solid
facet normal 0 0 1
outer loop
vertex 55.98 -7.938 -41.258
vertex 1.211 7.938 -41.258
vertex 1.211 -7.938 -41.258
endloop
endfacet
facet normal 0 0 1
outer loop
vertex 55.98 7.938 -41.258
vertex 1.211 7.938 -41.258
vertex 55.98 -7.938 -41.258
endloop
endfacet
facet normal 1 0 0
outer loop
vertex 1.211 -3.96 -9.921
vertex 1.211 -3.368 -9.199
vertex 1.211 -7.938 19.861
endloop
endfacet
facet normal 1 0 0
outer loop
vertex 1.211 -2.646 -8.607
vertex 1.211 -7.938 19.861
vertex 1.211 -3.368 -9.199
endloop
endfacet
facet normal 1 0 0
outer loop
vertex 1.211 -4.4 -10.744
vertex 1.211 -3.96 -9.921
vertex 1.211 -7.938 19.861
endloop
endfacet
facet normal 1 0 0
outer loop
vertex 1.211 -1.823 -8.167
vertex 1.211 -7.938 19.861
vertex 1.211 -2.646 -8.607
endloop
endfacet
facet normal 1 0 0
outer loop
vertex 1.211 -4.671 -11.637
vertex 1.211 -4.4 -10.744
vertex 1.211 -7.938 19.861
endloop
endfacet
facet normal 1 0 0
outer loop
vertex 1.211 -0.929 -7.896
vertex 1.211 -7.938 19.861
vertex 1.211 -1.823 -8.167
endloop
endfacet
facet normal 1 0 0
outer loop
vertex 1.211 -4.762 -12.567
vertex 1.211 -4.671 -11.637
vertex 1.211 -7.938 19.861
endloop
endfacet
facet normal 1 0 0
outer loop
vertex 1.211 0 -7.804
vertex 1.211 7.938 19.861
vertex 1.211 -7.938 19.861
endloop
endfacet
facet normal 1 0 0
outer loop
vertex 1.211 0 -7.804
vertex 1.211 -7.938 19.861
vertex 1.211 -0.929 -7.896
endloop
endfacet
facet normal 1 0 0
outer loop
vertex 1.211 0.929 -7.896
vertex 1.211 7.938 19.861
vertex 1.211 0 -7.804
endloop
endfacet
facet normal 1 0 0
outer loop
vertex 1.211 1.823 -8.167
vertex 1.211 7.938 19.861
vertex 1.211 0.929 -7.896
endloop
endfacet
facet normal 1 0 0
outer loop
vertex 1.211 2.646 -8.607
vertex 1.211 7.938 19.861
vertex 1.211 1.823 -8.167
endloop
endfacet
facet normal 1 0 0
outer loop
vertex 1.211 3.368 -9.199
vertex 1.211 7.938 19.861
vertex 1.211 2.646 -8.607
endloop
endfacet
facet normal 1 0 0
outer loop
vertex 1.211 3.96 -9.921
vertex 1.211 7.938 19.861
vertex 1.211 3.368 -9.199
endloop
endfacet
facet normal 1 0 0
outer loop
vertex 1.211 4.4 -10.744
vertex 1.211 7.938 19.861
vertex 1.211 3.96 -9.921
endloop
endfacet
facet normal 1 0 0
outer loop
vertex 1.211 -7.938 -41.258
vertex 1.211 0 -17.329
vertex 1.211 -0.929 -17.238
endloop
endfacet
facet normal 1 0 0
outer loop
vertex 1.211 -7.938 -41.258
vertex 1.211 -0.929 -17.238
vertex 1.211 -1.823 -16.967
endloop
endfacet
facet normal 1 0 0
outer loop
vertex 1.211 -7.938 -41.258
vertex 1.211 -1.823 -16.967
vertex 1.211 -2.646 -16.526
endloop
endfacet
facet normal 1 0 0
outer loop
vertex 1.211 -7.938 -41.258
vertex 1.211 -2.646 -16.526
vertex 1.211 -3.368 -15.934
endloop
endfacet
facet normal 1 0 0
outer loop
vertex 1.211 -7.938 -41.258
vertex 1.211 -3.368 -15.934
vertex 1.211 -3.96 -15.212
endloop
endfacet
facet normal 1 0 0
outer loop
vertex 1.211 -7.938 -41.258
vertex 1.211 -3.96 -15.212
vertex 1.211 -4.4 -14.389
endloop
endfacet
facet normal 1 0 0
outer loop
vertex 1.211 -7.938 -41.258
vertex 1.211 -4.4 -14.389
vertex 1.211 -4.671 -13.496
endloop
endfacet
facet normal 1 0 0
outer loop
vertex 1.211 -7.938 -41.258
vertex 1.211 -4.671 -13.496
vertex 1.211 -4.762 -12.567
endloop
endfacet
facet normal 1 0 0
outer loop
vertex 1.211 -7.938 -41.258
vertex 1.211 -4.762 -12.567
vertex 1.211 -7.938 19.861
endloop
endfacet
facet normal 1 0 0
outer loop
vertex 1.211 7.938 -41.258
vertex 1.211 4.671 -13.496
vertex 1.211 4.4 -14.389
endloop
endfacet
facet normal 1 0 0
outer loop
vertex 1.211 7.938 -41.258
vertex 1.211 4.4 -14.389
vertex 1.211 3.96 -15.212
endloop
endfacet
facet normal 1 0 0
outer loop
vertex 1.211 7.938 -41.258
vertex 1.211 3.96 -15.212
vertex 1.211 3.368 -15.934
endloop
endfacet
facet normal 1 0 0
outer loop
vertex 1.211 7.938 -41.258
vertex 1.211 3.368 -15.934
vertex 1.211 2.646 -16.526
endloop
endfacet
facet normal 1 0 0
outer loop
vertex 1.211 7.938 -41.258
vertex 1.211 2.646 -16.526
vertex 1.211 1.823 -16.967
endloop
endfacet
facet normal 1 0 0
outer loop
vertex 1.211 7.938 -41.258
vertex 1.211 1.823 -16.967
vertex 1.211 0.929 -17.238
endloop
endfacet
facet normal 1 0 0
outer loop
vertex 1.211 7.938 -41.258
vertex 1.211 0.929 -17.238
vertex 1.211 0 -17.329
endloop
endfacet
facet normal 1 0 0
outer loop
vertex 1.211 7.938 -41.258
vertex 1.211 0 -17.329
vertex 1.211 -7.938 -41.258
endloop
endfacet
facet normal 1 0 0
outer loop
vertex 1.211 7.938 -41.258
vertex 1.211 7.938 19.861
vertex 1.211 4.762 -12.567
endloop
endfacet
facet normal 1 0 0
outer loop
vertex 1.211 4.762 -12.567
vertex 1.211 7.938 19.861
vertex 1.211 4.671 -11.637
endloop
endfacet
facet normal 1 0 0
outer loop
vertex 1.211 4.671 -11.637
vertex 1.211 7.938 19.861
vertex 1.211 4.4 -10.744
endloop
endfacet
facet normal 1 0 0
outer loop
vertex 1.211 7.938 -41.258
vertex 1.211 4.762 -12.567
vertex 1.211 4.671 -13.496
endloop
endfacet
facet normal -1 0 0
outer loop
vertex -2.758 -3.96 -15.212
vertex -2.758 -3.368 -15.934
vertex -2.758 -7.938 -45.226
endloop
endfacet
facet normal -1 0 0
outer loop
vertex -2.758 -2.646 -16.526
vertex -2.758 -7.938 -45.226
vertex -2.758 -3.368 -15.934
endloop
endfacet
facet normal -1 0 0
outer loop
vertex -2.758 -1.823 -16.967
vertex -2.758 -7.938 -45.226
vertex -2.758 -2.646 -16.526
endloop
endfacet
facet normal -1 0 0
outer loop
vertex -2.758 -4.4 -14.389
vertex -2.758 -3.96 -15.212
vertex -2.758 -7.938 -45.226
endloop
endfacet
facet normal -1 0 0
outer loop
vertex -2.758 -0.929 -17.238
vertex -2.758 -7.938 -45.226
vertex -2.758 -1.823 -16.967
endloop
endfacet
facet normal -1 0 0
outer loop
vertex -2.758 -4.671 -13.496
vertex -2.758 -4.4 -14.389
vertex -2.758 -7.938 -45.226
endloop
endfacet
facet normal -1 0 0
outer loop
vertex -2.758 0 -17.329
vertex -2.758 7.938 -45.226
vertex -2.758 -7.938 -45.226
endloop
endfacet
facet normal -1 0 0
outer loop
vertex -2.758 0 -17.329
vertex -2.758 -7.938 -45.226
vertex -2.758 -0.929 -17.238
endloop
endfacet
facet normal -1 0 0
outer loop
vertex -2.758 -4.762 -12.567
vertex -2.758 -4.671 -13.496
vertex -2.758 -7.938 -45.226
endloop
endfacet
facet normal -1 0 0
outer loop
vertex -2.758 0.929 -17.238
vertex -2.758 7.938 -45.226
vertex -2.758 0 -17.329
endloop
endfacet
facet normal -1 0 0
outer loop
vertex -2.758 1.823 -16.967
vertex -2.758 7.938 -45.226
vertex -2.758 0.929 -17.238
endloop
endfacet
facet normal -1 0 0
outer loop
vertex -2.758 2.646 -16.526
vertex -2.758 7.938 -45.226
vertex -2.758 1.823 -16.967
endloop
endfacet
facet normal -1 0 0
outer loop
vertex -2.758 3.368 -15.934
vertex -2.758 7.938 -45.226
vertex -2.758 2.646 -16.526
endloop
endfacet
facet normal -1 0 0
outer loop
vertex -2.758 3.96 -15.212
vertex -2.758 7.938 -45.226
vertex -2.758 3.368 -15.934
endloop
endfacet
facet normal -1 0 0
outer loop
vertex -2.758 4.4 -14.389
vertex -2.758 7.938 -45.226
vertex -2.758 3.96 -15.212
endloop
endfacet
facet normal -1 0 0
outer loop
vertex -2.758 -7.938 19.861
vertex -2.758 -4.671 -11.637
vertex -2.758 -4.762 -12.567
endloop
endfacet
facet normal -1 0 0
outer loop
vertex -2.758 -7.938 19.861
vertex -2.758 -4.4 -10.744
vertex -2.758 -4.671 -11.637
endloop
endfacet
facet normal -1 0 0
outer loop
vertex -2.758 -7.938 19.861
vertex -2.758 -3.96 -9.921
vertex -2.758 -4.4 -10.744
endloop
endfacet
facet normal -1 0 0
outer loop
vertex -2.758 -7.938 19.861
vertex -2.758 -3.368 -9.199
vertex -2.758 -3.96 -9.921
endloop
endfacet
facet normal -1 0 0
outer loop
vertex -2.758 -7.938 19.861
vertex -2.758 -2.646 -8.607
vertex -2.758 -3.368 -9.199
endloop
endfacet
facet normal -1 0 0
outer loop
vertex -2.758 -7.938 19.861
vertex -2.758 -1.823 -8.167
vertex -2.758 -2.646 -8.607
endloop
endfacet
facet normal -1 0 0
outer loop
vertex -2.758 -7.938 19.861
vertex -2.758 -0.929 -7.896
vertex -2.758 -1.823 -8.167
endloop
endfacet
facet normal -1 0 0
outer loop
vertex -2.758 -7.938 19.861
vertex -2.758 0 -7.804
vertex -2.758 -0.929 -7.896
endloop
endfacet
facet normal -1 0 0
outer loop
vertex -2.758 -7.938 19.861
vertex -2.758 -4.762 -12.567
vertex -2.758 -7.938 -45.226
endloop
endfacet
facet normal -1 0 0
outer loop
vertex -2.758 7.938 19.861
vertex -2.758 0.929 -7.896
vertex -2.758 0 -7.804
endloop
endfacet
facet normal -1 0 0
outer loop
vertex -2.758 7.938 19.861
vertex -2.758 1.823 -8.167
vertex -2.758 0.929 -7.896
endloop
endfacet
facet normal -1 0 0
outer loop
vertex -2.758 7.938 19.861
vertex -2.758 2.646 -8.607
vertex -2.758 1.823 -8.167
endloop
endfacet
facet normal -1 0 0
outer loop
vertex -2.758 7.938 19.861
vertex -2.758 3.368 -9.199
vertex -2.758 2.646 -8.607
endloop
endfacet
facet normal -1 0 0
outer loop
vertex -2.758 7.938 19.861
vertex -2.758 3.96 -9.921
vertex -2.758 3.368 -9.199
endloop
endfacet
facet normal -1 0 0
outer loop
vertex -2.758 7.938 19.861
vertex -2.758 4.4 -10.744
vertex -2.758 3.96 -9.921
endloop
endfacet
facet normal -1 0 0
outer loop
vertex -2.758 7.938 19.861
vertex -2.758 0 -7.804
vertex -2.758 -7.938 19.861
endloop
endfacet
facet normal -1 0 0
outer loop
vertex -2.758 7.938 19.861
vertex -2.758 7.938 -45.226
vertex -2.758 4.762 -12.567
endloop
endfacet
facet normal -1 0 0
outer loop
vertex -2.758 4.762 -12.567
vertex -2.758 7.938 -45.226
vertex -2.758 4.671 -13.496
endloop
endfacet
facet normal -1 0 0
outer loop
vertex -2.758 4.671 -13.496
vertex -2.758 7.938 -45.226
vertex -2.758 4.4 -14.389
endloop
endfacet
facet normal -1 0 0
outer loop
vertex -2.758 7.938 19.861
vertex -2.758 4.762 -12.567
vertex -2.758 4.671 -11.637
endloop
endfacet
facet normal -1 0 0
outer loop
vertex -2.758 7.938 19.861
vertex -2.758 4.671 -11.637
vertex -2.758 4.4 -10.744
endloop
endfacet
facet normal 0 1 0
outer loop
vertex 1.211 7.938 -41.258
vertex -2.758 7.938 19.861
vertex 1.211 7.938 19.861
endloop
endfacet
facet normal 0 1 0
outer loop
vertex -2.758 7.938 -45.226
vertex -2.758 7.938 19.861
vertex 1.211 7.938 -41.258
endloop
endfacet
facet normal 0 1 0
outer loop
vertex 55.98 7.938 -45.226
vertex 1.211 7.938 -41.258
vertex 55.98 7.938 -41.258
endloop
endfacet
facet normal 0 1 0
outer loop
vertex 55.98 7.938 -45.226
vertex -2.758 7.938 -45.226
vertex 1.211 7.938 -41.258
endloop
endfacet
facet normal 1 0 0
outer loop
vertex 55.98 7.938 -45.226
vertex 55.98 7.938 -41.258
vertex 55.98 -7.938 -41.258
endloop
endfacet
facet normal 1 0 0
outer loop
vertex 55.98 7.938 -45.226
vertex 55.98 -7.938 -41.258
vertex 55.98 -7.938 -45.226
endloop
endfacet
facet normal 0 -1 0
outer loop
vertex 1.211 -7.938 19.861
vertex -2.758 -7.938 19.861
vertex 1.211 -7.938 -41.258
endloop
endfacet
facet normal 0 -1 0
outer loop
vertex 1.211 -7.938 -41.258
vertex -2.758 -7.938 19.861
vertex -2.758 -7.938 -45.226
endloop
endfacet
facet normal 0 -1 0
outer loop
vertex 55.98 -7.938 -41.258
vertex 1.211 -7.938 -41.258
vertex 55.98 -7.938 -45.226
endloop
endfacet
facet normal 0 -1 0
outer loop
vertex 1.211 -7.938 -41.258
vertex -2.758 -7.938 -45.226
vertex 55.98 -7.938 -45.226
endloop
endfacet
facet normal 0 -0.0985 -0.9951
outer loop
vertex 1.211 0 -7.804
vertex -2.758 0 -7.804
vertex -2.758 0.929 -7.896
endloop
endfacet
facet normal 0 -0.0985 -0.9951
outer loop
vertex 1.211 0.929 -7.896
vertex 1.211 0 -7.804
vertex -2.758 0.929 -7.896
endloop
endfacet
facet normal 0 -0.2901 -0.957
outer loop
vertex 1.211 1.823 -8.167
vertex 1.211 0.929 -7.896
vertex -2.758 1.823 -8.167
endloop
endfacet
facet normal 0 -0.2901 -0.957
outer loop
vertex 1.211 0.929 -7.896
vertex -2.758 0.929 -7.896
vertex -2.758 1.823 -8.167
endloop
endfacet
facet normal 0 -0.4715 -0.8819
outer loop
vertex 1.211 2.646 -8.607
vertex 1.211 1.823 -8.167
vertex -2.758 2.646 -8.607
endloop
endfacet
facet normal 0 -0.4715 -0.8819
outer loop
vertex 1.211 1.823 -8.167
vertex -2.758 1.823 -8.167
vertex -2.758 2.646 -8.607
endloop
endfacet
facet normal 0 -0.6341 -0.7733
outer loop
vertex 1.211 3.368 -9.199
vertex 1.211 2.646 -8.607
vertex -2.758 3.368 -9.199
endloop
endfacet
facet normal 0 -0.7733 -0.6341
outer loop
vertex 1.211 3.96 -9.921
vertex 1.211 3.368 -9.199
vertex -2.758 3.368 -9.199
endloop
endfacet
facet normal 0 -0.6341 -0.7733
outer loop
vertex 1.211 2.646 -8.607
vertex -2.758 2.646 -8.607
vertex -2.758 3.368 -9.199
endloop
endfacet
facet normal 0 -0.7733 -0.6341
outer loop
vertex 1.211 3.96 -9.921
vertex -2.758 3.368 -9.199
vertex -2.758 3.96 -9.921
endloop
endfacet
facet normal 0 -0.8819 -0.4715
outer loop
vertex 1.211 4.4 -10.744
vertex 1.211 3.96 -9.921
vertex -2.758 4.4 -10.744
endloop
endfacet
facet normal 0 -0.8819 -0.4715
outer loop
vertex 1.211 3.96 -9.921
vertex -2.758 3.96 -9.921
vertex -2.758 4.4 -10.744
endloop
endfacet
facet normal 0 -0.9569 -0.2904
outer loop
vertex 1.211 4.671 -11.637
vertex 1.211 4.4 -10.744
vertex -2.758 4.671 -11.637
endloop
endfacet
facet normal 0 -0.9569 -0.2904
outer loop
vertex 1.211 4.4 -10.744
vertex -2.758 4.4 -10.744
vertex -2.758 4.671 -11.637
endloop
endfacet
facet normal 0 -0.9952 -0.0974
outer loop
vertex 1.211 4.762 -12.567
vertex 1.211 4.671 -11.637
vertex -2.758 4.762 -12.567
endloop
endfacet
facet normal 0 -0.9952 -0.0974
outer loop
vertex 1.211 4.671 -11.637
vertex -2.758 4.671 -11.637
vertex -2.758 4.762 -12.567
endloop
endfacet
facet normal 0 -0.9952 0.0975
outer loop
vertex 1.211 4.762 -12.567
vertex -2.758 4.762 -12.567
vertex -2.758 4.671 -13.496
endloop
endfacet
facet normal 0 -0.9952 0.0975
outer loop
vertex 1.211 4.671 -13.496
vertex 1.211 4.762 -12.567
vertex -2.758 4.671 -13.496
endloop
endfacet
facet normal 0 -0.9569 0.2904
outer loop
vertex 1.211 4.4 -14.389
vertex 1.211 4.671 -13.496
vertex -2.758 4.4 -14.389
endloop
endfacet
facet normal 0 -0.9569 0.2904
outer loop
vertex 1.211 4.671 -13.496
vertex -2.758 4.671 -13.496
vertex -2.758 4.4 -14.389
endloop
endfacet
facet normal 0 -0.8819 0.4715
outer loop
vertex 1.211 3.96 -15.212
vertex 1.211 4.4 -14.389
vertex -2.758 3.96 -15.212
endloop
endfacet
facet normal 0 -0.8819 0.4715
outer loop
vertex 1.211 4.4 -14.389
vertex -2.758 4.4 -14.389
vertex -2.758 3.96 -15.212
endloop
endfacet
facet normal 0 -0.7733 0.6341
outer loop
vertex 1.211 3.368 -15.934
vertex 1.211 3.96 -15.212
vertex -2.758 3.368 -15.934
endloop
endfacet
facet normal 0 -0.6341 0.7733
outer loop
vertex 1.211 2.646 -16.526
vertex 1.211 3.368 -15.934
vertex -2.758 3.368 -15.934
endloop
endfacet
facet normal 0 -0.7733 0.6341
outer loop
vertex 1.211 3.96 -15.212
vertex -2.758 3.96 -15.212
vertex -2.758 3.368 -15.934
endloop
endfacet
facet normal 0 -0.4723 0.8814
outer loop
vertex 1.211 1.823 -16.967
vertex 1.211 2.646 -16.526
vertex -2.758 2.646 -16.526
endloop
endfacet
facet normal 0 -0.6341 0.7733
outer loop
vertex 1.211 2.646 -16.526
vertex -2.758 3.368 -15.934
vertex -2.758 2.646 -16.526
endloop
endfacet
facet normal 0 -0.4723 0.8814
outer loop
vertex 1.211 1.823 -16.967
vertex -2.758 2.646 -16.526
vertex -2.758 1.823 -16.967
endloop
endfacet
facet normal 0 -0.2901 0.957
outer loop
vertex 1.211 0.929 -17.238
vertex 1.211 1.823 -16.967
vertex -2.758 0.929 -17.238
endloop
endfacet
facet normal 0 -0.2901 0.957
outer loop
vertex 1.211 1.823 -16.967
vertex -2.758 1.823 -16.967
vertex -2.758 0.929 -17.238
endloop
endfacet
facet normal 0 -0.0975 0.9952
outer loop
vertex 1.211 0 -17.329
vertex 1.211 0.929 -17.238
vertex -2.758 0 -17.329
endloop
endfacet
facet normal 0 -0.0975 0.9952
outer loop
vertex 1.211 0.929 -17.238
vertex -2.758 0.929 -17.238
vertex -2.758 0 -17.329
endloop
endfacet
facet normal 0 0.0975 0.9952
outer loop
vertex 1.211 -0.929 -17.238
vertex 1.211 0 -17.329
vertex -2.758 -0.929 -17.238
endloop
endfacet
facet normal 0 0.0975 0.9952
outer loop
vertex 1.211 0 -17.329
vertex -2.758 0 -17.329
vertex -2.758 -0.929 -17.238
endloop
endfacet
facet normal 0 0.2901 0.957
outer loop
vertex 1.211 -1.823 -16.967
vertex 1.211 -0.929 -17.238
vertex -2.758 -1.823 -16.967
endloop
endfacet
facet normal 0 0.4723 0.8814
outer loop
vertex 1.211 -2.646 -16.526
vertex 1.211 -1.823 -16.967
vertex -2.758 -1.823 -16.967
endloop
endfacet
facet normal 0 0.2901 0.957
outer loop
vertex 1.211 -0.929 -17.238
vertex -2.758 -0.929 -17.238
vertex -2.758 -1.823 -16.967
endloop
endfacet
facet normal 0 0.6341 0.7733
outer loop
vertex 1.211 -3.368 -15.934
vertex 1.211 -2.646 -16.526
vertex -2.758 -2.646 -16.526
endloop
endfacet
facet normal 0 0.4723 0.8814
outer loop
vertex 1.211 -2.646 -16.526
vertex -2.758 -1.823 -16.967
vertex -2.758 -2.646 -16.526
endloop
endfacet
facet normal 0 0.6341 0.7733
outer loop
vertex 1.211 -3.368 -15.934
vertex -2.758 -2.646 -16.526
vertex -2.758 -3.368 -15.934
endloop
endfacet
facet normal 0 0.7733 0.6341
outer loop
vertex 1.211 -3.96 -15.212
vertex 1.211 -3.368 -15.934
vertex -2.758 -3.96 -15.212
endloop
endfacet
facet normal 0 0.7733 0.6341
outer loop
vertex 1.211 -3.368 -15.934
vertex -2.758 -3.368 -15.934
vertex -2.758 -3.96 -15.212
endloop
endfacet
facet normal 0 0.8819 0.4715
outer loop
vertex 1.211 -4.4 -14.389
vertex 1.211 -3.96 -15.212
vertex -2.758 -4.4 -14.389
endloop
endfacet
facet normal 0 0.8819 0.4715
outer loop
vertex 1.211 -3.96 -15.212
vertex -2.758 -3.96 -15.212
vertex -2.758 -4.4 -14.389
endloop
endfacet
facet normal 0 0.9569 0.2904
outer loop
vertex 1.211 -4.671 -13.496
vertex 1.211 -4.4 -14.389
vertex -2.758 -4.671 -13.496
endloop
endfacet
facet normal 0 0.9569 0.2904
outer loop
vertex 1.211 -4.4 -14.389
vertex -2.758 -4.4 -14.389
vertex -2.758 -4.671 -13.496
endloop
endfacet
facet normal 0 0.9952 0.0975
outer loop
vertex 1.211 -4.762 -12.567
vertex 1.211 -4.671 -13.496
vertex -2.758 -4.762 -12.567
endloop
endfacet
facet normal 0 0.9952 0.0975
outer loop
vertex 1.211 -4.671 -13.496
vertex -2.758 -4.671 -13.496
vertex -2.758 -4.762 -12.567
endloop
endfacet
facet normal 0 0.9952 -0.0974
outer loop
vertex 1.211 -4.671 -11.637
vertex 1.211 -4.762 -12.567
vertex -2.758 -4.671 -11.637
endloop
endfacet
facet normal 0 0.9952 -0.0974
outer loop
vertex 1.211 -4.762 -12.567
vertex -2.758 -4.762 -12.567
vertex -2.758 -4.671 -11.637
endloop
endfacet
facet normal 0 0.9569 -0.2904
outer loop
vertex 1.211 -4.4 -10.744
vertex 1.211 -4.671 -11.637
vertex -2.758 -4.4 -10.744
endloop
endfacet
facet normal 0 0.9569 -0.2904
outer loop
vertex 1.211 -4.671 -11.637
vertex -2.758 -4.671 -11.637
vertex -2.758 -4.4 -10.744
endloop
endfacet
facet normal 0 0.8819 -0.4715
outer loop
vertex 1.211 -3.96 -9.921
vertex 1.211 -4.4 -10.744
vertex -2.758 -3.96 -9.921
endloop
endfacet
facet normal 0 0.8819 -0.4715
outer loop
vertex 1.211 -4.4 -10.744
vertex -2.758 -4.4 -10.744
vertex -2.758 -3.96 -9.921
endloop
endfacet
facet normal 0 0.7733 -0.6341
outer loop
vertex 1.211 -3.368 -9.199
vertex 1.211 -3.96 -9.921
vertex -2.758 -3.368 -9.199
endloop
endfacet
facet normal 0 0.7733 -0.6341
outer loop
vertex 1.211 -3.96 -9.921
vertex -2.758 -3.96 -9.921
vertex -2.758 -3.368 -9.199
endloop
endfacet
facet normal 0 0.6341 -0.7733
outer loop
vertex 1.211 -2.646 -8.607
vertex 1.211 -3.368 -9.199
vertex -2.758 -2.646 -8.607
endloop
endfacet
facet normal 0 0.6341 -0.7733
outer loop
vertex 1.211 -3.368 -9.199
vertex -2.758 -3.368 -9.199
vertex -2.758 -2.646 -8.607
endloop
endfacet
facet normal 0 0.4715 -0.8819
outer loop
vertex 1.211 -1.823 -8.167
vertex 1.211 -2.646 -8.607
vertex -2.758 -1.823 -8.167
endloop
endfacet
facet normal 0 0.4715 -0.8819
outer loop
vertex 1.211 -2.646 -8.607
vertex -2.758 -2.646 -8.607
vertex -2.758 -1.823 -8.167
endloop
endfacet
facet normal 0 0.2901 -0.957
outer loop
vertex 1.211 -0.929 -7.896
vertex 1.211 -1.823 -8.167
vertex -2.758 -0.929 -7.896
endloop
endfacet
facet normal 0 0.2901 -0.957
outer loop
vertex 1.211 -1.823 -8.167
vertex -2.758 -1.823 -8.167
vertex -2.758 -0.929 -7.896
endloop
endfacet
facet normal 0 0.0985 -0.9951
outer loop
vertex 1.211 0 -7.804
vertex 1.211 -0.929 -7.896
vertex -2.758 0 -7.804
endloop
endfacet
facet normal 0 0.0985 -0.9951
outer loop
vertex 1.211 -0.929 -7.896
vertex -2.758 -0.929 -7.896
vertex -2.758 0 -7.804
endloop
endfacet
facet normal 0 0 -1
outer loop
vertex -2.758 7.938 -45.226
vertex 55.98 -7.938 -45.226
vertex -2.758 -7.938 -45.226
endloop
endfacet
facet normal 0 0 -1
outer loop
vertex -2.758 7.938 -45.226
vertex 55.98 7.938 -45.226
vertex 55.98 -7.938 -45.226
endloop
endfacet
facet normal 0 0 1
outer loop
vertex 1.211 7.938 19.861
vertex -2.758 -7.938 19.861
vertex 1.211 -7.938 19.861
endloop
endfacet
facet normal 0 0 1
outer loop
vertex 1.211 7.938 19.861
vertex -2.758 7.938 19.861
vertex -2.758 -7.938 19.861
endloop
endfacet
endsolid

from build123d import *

# Parameters (mm, degrees)
BOSS_EXTRUDE1_DEPTH = 7.9375
SKETCH3_R           = 4.7625
CUT_EXTRUDE1_DEPTH  = 3.96875


with BuildPart() as part:
    # Sketch1 → Boss-Extrude1 (new, symmetric)
    with BuildSketch(Plane(origin=(0, 0, 0), x_dir=(1, 0, 0), z_dir=(0, 1, 0))):
        Polygon((-2.757708096, -19.86108723), (1.211041904, -19.86108723), (1.211041904, 41.25766277), (55.979791904, 41.25766277), (55.979791904, 45.22641277), (6.27967861, 45.22641277), (-2.757708096, 45.22641277), align=None)
    extrude(amount=BOSS_EXTRUDE1_DEPTH, both=True)

    # Sketch3 → Cut-Extrude1 (cut)
    with BuildSketch(Plane.ZY.offset(2.757708096)):
        with Locations((-12.566559842, 0)):
            Circle(SKETCH3_R)
    extrude(amount=-CUT_EXTRUDE1_DEPTH, mode=Mode.SUBTRACT)


solid = part.part
